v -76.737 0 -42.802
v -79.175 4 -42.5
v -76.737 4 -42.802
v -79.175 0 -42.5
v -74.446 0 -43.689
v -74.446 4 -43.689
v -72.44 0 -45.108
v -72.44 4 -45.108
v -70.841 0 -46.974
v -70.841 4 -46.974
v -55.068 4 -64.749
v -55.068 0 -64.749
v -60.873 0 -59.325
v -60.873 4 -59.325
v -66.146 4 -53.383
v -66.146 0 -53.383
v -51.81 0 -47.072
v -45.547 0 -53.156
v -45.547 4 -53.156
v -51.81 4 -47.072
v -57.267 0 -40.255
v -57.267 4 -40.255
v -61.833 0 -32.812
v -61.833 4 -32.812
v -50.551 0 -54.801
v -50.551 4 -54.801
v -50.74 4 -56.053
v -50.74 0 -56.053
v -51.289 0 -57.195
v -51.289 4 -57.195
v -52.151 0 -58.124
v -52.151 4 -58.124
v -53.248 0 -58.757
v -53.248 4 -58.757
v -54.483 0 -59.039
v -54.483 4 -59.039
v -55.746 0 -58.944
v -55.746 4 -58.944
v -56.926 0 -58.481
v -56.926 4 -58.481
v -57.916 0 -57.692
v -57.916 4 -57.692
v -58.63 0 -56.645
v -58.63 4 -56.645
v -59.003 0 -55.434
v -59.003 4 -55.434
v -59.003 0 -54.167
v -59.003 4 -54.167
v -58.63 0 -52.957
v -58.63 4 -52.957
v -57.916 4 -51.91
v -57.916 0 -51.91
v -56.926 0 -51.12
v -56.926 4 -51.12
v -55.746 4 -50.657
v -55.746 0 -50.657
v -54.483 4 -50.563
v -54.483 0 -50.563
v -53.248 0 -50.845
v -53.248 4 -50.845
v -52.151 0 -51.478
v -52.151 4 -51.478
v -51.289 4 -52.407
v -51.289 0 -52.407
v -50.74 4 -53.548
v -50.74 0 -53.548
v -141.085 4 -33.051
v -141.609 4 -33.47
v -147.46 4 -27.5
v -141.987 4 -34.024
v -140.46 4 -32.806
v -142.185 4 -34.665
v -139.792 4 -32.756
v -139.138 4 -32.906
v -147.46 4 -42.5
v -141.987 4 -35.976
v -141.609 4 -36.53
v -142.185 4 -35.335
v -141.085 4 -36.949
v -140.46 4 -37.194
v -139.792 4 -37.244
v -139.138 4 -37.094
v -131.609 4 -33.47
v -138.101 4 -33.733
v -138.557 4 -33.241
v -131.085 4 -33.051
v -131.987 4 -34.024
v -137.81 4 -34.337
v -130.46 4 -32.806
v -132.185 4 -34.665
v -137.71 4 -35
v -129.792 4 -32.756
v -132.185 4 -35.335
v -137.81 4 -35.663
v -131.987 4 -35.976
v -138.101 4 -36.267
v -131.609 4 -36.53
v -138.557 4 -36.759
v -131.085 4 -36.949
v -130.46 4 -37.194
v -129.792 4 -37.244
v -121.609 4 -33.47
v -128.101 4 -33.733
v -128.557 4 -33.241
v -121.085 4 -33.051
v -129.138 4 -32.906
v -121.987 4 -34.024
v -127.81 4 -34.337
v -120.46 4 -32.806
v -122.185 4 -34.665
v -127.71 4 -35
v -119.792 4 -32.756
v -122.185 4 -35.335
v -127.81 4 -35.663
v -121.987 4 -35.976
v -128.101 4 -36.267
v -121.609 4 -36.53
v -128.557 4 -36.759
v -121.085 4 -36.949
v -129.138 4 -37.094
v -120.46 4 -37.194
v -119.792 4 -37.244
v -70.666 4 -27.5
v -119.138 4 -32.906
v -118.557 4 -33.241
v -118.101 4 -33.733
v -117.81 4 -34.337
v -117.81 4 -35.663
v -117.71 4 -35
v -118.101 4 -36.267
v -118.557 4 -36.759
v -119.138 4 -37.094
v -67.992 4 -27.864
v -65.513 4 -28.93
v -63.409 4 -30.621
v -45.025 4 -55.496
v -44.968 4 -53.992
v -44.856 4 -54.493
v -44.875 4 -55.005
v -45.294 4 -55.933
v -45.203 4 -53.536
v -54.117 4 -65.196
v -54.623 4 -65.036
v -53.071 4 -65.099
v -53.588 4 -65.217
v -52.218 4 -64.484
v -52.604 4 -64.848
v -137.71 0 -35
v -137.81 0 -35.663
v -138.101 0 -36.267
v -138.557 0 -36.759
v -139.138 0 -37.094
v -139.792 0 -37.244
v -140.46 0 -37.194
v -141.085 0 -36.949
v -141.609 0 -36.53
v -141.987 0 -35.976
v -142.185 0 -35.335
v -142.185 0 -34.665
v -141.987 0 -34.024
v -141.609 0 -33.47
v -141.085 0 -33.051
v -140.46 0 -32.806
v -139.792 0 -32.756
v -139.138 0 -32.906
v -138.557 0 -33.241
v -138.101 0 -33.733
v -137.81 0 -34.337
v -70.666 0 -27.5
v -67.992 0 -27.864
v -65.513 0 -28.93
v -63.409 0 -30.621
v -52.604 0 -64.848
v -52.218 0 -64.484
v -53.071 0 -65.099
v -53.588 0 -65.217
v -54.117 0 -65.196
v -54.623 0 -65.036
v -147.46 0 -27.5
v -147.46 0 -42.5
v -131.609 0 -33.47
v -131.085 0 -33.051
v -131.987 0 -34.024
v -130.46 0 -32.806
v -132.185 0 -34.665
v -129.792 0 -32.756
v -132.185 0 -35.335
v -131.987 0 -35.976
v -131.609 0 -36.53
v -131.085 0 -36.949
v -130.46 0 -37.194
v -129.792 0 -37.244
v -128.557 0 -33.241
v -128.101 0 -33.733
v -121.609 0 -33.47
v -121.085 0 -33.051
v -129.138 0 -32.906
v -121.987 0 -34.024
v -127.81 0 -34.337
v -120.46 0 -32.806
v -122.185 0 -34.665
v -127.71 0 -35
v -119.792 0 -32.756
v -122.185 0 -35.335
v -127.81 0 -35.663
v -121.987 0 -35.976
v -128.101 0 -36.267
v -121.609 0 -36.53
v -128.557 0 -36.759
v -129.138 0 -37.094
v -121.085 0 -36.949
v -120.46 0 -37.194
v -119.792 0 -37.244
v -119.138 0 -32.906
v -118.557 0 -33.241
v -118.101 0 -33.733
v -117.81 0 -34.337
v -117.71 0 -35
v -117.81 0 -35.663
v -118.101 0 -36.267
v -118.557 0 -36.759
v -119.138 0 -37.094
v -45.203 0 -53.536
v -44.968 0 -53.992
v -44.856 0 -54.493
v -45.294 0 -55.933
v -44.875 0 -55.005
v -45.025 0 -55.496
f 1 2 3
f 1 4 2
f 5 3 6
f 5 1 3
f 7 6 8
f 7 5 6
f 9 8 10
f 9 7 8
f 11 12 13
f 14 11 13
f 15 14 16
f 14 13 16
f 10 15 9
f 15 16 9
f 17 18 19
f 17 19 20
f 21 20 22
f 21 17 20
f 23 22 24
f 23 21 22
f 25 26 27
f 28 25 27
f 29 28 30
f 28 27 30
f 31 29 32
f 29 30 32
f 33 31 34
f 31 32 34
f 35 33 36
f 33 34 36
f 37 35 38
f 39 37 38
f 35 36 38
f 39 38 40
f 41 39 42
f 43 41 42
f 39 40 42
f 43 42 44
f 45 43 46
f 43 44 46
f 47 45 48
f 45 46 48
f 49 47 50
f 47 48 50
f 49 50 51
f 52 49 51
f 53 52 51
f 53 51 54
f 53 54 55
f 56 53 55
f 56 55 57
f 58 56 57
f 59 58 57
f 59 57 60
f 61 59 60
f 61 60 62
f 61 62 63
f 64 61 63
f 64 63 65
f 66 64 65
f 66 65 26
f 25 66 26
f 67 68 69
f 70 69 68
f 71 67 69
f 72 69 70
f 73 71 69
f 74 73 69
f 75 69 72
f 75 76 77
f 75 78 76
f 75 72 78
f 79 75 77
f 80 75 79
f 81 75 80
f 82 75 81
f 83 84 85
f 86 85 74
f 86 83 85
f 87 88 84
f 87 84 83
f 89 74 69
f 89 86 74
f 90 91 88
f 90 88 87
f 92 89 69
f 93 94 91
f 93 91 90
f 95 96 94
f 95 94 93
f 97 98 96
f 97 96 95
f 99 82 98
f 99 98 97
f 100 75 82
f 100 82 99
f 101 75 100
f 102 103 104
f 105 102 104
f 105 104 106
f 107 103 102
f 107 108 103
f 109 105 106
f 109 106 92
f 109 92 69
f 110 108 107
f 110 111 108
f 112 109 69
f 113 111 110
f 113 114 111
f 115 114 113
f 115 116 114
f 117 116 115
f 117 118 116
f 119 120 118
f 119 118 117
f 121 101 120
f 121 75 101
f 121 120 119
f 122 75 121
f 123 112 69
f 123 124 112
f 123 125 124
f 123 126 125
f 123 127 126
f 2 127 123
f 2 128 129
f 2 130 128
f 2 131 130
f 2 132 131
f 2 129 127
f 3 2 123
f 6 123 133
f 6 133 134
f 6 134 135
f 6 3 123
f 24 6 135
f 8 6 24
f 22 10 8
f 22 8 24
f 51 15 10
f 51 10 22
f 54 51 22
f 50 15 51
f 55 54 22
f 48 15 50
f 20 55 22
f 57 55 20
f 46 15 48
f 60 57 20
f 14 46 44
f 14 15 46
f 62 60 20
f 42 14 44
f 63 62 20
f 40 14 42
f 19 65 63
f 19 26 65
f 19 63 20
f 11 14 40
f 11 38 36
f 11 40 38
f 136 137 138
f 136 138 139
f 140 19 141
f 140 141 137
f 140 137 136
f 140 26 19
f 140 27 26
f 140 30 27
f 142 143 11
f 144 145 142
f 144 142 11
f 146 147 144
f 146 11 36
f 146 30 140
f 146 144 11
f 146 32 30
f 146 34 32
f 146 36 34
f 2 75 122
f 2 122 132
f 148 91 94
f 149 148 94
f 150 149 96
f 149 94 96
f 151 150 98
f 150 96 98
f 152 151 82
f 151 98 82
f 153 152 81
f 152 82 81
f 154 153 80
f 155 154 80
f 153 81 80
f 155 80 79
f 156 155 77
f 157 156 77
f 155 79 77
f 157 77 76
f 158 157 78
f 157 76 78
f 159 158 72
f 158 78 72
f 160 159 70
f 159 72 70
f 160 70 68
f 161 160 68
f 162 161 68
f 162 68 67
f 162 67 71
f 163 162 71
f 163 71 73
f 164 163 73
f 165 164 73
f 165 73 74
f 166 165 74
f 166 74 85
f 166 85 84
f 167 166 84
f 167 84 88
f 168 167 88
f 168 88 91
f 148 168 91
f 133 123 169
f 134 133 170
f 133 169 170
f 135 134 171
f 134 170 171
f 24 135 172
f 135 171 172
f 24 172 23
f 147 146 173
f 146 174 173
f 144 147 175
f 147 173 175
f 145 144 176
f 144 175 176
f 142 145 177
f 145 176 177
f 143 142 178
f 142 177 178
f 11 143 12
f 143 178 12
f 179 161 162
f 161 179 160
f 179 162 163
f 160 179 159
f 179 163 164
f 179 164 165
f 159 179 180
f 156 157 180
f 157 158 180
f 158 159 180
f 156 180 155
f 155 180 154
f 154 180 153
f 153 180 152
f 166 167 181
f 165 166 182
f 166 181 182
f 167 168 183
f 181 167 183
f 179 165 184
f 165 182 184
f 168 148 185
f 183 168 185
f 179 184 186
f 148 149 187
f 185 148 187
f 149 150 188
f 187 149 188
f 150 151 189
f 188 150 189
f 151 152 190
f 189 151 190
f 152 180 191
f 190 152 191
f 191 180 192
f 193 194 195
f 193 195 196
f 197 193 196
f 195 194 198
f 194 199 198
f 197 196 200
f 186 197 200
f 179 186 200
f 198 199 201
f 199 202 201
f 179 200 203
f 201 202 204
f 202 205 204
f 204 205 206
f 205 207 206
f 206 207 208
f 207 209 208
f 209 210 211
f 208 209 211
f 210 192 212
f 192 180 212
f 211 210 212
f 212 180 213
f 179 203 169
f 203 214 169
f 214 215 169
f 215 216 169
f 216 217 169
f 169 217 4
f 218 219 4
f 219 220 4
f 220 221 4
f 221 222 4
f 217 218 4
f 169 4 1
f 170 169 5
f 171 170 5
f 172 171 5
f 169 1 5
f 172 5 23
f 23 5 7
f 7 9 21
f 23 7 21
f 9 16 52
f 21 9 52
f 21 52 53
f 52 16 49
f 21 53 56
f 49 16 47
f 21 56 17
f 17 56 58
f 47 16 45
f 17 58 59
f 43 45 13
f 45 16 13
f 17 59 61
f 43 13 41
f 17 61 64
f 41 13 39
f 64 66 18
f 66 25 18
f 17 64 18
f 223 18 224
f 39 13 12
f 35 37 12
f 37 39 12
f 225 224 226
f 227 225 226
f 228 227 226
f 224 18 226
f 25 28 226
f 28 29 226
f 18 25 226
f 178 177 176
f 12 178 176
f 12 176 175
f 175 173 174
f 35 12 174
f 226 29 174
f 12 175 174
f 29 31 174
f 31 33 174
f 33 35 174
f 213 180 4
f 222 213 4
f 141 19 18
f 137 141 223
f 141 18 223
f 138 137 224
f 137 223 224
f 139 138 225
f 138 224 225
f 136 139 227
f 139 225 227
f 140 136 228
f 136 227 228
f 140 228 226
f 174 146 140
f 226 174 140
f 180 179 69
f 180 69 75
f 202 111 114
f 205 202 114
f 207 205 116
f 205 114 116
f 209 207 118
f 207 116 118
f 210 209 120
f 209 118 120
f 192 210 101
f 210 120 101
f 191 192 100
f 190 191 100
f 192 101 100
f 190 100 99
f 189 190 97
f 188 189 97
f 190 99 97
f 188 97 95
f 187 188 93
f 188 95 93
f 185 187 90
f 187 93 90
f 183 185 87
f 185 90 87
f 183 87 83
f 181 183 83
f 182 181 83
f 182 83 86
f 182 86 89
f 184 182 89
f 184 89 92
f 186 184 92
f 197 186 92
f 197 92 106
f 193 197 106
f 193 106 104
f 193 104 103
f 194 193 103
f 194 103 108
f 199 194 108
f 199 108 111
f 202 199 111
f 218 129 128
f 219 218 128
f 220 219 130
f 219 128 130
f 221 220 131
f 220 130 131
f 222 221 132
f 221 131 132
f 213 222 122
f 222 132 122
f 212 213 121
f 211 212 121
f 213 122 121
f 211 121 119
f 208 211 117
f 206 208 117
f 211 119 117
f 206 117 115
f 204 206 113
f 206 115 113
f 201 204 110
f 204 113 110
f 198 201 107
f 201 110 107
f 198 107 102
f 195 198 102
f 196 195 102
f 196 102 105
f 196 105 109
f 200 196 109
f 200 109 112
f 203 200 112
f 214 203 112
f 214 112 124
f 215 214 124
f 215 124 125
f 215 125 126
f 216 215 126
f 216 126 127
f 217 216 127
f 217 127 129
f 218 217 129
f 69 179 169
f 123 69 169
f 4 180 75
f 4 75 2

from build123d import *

# Parameters (mm, degrees)
SKETCH1_R           = 85
BOSS_EXTRUDE1_DEPTH = 4
SKETCH2_R           = 4.25
CUT_EXTRUDE1_DEPTH  = 5
CUT_EXTRUDE2_DEPTH  = 5
SKETCH5_W           = 42.180521306
SKETCH5_H           = 70
CUT_EXTRUDE4_DEPTH  = 5
SKETCH6_W           = 106.727452964
SKETCH6_H           = 15
BOSS_EXTRUDE3_DEPTH = 4
SKETCH7_R           = 70
CUT_EXTRUDE5_DEPTH  = 5
SKETCH8_R           = 2.25
CUT_EXTRUDE6_DEPTH  = 5
LPATTERN1_COUNT     = 3
LPATTERN1_PITCH     = 10
FILLET1_R           = 10
FILLET2_R           = 2


with BuildPart() as part:
    # Sketch1 → Boss-Extrude1 (new body)
    with BuildSketch(Plane(origin=(0, 0, 0), x_dir=(1, 0, 0), z_dir=(0, 1, 0))):
        Circle(SKETCH1_R)
    extrude(amount=BOSS_EXTRUDE1_DEPTH)

    # Sketch2 → Cut-Extrude1 (cut, through all)
    with BuildSketch(Plane(origin=(0, 4, 0), x_dir=(1, 0, 0), z_dir=(0, 1, 0))):
        with Locations((-54.800775542, 54.800775542)):
            Circle(SKETCH2_R)
    extrude(amount=-CUT_EXTRUDE1_DEPTH, mode=Mode.SUBTRACT)

    # Sketch3 → Cut-Extrude2 (cut, through all)
    with BuildSketch(Plane(origin=(0, 4, 0), x_dir=(1, 0, 0), z_dir=(0, 1, 0))):
        with BuildLine():
            Line((0, 0), (-85, 0))
            ThreePointArc((-85, 0), (76.71974917, -36.593443229), (-53.492233239, 66.057406724))
            Line((-53.492233239, 66.057406724), (0, 0))
        make_face()
    extrude(amount=-CUT_EXTRUDE2_DEPTH, mode=Mode.SUBTRACT)

    # Sketch5 → Cut-Extrude4 (cut, through all)
    with BuildSketch(Plane(origin=(0, 0, 0), x_dir=(1, 0, 0), z_dir=(0, 1, 0))):
        with Locations((-74.50134639, 0)):
            Rectangle(SKETCH5_W, SKETCH5_H)
    extrude(amount=CUT_EXTRUDE4_DEPTH, mode=Mode.SUBTRACT)

    # Sketch6 → Boss-Extrude3 (add)
    with BuildSketch(Plane(origin=(0, 0, 0), x_dir=(1, 0, 0), z_dir=(0, 1, 0))):
        with Locations((-94.095940442, 35)):
            Rectangle(SKETCH6_W, SKETCH6_H)
    extrude(amount=BOSS_EXTRUDE3_DEPTH)

    # Sketch7 → Cut-Extrude5 (cut, through all)
    with BuildSketch(Plane(origin=(0, 0, 0), x_dir=(1, 0, 0), z_dir=(0, 1, 0))):
        Circle(SKETCH7_R)
    extrude(amount=CUT_EXTRUDE5_DEPTH, mode=Mode.SUBTRACT)

    # Sketch8 → Cut-Extrude6 (cut, through all)
    with BuildSketch(Plane(origin=(0, 4, 0), x_dir=(1, 0, 0), z_dir=(0, 1, 0))):
        with Locations((-139.959666924, 35)):
            Circle(SKETCH8_R)
    cut_extrude6 = extrude(amount=-CUT_EXTRUDE6_DEPTH, mode=Mode.SUBTRACT)

    # LPattern1: Cut-Extrude6 ×3
    with Locations(*[(i * LPATTERN1_PITCH, 0, 0) for i in range(1, LPATTERN1_COUNT)]):
        add(cut_extrude6, mode=Mode.SUBTRACT)

    # Fillet1
    fillet1_edges = [part.edges().sort_by_distance(p)[0] for p in [
        (-73.612159322, 2, -42.5),
        (-64.371965948, 2, -27.5),
    ]]
    fillet(fillet1_edges, radius=FILLET1_R)

    # Fillet2
    fillet2_edges = [part.edges().sort_by_distance(p)[0] for p in [
        (-53.492233239, 2, -66.057406724),
        (-44.052427373, 2, -54.400217302),
    ]]
    fillet(fillet2_edges, radius=FILLET2_R)


solid = part.part
